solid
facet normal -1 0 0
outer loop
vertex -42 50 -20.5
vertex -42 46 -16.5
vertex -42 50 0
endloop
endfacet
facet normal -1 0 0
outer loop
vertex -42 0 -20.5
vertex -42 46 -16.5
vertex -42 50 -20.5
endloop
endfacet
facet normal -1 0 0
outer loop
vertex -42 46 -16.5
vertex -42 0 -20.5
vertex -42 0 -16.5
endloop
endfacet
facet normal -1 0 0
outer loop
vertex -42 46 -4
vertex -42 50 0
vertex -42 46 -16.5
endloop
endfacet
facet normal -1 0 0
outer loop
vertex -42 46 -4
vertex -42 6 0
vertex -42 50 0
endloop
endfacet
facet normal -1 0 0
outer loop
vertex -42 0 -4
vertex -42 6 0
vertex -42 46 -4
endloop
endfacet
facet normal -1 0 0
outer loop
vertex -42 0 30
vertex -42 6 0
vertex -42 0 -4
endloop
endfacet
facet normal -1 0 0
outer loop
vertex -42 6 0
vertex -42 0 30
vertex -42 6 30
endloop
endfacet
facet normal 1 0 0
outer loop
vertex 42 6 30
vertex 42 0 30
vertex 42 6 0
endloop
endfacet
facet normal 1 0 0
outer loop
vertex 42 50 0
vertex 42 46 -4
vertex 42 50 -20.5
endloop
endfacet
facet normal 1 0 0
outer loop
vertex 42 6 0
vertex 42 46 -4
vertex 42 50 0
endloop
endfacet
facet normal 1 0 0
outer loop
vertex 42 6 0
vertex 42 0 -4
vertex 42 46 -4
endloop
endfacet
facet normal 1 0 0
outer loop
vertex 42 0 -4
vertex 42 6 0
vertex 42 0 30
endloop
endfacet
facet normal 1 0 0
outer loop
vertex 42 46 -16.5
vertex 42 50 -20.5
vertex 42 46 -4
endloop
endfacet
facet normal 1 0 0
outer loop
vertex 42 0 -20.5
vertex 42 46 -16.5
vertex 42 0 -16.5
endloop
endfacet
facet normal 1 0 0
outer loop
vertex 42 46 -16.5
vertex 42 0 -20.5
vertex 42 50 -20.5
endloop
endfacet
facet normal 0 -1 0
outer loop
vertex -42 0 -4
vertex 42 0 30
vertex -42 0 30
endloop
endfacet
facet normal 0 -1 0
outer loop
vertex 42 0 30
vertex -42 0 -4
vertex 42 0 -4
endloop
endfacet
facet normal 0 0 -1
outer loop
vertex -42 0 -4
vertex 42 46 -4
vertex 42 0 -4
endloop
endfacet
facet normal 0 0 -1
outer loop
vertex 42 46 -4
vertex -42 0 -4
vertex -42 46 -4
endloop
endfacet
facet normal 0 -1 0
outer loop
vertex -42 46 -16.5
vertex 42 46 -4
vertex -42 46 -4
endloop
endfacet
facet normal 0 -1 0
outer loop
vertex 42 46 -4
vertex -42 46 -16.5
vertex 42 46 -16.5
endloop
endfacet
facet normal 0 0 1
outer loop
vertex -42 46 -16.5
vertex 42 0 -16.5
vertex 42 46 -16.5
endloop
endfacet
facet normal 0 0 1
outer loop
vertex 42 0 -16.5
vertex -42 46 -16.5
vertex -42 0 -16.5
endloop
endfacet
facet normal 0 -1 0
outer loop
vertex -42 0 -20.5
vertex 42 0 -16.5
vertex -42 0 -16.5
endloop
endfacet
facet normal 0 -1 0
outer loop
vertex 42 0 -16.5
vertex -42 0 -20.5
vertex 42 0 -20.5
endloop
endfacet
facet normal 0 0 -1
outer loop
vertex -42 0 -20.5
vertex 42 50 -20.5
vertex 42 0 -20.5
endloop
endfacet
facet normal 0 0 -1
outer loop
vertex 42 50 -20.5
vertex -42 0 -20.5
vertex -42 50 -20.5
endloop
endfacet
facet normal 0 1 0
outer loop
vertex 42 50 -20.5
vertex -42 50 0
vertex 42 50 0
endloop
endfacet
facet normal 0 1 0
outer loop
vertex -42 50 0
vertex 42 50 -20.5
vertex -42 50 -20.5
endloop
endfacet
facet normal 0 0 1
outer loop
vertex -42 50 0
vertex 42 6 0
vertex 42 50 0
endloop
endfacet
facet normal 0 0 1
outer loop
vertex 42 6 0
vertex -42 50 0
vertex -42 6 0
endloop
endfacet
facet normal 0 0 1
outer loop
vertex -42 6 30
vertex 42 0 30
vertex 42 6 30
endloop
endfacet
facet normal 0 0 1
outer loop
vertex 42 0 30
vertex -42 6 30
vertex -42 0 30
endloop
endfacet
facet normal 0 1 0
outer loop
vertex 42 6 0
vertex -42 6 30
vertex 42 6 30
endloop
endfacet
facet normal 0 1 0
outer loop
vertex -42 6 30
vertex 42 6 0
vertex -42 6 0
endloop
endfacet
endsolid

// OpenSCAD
// 8-tube PCR strip holder that hooks over a 12 mm ice-bucket wall.
// Printed as used: rests on the XY plane (z = 0), builds upward (+Z),
// centred on x = 0. The YZ profile is an upside-down U that fits over
// the wall; a flat ledge extends toward -Y into the ice and carries the
// eight tube holes.

// ---- dimensions (mm) ----
$fn = 64;

// overall extrusion of the YZ profile, along X, centred on x = 0
extrude_len   = 84;

// upside-down U profile (YZ plane)
inner_leg_y0  = 0;      // inner face of inner leg (against wall)
inner_leg_y1  = 4;      // outer face of inner leg  (wall thickness = 4)
outer_leg_y0  = 16.5;   // inner face of outer leg  (gap = 12.5 for the 12 mm wall)
outer_leg_y1  = 20.5;   // outer face of outer leg  (outer leg thickness = 4)
leg_z0        = 0;      // bottom of both legs (sits on the XY plane)
leg_z1        = 50;     // top of both legs
bridge_z0     = 46;     // bottom of the top bridge
bridge_z1     = 50;     // top of the top bridge

// flat ledge that reaches toward -Y into the ice
ledge_y0      = -30;    // far end of the ledge
ledge_y1      = 0;      // meets the foot of the inner leg
ledge_z0      = 0;      // bottom of the ledge
ledge_z1      = 6;      // top of the ledge (6 mm thick)

// eight vertical tube through-holes in the ledge
n_tubes       = 8;
hole_d        = 6.4;    // hole diameter
hole_pitch    = 9;      // spacing along X
hole_y        = -15;    // hole centre in Y
hole_z0       = -1;     // extend past the bottom face (z = 0)
hole_z1       = 7;      // extend past the top face (z = 6)

// ---- solid ----
difference() {
    union() {
        // upside-down U profile in the YZ plane, extruded 84 mm along X,
        // centred on x = 0, resting on z = 0
        rotate([0, 90, 0]) {
            linear_extrude(extrude_len, center = true) {
                // inner leg (y = 0..4, z = 0..50)
                polygon([
                    [inner_leg_y0, leg_z0],
                    [inner_leg_y1, leg_z0],
                    [inner_leg_y1, leg_z1],
                    [inner_leg_y0, leg_z1]
                ]);
                // outer leg (y = 16.5..20.5, z = 0..50)
                polygon([
                    [outer_leg_y0, leg_z0],
                    [outer_leg_y1, leg_z0],
                    [outer_leg_y1, leg_z1],
                    [outer_leg_y0, leg_z1]
                ]);
                // top bridge joining the legs (y = 0..20.5, z = 46..50)
                polygon([
                    [inner_leg_y0, bridge_z0],
                    [outer_leg_y1, bridge_z0],
                    [outer_leg_y1, bridge_z1],
                    [inner_leg_y0, bridge_z1]
                ]);
            }
        }

        // flat ledge toward -Y (y = -30..0, z = 0..6), extruded 84 mm along X
        rotate([0, 90, 0]) {
            linear_extrude(extrude_len, center = true) {
                polygon([
                    [ledge_y0, ledge_z0],
                    [ledge_y1, ledge_z0],
                    [ledge_y1, ledge_z1],
                    [ledge_y0, ledge_z1]
                ]);
            }
        }
    }

    // eight vertical 6.4 mm through-holes, 9 mm apart along X, centred, at y = -15
    for (i = [0 : n_tubes - 1]) {
        x_pos = (i - (n_tubes - 1) / 2) * hole_pitch;
        translate([x_pos, hole_y, hole_z0]) {
            cylinder(h = (hole_z1 - hole_z0), r = hole_d / 2, $fn = $fn);
        }
    }
}
